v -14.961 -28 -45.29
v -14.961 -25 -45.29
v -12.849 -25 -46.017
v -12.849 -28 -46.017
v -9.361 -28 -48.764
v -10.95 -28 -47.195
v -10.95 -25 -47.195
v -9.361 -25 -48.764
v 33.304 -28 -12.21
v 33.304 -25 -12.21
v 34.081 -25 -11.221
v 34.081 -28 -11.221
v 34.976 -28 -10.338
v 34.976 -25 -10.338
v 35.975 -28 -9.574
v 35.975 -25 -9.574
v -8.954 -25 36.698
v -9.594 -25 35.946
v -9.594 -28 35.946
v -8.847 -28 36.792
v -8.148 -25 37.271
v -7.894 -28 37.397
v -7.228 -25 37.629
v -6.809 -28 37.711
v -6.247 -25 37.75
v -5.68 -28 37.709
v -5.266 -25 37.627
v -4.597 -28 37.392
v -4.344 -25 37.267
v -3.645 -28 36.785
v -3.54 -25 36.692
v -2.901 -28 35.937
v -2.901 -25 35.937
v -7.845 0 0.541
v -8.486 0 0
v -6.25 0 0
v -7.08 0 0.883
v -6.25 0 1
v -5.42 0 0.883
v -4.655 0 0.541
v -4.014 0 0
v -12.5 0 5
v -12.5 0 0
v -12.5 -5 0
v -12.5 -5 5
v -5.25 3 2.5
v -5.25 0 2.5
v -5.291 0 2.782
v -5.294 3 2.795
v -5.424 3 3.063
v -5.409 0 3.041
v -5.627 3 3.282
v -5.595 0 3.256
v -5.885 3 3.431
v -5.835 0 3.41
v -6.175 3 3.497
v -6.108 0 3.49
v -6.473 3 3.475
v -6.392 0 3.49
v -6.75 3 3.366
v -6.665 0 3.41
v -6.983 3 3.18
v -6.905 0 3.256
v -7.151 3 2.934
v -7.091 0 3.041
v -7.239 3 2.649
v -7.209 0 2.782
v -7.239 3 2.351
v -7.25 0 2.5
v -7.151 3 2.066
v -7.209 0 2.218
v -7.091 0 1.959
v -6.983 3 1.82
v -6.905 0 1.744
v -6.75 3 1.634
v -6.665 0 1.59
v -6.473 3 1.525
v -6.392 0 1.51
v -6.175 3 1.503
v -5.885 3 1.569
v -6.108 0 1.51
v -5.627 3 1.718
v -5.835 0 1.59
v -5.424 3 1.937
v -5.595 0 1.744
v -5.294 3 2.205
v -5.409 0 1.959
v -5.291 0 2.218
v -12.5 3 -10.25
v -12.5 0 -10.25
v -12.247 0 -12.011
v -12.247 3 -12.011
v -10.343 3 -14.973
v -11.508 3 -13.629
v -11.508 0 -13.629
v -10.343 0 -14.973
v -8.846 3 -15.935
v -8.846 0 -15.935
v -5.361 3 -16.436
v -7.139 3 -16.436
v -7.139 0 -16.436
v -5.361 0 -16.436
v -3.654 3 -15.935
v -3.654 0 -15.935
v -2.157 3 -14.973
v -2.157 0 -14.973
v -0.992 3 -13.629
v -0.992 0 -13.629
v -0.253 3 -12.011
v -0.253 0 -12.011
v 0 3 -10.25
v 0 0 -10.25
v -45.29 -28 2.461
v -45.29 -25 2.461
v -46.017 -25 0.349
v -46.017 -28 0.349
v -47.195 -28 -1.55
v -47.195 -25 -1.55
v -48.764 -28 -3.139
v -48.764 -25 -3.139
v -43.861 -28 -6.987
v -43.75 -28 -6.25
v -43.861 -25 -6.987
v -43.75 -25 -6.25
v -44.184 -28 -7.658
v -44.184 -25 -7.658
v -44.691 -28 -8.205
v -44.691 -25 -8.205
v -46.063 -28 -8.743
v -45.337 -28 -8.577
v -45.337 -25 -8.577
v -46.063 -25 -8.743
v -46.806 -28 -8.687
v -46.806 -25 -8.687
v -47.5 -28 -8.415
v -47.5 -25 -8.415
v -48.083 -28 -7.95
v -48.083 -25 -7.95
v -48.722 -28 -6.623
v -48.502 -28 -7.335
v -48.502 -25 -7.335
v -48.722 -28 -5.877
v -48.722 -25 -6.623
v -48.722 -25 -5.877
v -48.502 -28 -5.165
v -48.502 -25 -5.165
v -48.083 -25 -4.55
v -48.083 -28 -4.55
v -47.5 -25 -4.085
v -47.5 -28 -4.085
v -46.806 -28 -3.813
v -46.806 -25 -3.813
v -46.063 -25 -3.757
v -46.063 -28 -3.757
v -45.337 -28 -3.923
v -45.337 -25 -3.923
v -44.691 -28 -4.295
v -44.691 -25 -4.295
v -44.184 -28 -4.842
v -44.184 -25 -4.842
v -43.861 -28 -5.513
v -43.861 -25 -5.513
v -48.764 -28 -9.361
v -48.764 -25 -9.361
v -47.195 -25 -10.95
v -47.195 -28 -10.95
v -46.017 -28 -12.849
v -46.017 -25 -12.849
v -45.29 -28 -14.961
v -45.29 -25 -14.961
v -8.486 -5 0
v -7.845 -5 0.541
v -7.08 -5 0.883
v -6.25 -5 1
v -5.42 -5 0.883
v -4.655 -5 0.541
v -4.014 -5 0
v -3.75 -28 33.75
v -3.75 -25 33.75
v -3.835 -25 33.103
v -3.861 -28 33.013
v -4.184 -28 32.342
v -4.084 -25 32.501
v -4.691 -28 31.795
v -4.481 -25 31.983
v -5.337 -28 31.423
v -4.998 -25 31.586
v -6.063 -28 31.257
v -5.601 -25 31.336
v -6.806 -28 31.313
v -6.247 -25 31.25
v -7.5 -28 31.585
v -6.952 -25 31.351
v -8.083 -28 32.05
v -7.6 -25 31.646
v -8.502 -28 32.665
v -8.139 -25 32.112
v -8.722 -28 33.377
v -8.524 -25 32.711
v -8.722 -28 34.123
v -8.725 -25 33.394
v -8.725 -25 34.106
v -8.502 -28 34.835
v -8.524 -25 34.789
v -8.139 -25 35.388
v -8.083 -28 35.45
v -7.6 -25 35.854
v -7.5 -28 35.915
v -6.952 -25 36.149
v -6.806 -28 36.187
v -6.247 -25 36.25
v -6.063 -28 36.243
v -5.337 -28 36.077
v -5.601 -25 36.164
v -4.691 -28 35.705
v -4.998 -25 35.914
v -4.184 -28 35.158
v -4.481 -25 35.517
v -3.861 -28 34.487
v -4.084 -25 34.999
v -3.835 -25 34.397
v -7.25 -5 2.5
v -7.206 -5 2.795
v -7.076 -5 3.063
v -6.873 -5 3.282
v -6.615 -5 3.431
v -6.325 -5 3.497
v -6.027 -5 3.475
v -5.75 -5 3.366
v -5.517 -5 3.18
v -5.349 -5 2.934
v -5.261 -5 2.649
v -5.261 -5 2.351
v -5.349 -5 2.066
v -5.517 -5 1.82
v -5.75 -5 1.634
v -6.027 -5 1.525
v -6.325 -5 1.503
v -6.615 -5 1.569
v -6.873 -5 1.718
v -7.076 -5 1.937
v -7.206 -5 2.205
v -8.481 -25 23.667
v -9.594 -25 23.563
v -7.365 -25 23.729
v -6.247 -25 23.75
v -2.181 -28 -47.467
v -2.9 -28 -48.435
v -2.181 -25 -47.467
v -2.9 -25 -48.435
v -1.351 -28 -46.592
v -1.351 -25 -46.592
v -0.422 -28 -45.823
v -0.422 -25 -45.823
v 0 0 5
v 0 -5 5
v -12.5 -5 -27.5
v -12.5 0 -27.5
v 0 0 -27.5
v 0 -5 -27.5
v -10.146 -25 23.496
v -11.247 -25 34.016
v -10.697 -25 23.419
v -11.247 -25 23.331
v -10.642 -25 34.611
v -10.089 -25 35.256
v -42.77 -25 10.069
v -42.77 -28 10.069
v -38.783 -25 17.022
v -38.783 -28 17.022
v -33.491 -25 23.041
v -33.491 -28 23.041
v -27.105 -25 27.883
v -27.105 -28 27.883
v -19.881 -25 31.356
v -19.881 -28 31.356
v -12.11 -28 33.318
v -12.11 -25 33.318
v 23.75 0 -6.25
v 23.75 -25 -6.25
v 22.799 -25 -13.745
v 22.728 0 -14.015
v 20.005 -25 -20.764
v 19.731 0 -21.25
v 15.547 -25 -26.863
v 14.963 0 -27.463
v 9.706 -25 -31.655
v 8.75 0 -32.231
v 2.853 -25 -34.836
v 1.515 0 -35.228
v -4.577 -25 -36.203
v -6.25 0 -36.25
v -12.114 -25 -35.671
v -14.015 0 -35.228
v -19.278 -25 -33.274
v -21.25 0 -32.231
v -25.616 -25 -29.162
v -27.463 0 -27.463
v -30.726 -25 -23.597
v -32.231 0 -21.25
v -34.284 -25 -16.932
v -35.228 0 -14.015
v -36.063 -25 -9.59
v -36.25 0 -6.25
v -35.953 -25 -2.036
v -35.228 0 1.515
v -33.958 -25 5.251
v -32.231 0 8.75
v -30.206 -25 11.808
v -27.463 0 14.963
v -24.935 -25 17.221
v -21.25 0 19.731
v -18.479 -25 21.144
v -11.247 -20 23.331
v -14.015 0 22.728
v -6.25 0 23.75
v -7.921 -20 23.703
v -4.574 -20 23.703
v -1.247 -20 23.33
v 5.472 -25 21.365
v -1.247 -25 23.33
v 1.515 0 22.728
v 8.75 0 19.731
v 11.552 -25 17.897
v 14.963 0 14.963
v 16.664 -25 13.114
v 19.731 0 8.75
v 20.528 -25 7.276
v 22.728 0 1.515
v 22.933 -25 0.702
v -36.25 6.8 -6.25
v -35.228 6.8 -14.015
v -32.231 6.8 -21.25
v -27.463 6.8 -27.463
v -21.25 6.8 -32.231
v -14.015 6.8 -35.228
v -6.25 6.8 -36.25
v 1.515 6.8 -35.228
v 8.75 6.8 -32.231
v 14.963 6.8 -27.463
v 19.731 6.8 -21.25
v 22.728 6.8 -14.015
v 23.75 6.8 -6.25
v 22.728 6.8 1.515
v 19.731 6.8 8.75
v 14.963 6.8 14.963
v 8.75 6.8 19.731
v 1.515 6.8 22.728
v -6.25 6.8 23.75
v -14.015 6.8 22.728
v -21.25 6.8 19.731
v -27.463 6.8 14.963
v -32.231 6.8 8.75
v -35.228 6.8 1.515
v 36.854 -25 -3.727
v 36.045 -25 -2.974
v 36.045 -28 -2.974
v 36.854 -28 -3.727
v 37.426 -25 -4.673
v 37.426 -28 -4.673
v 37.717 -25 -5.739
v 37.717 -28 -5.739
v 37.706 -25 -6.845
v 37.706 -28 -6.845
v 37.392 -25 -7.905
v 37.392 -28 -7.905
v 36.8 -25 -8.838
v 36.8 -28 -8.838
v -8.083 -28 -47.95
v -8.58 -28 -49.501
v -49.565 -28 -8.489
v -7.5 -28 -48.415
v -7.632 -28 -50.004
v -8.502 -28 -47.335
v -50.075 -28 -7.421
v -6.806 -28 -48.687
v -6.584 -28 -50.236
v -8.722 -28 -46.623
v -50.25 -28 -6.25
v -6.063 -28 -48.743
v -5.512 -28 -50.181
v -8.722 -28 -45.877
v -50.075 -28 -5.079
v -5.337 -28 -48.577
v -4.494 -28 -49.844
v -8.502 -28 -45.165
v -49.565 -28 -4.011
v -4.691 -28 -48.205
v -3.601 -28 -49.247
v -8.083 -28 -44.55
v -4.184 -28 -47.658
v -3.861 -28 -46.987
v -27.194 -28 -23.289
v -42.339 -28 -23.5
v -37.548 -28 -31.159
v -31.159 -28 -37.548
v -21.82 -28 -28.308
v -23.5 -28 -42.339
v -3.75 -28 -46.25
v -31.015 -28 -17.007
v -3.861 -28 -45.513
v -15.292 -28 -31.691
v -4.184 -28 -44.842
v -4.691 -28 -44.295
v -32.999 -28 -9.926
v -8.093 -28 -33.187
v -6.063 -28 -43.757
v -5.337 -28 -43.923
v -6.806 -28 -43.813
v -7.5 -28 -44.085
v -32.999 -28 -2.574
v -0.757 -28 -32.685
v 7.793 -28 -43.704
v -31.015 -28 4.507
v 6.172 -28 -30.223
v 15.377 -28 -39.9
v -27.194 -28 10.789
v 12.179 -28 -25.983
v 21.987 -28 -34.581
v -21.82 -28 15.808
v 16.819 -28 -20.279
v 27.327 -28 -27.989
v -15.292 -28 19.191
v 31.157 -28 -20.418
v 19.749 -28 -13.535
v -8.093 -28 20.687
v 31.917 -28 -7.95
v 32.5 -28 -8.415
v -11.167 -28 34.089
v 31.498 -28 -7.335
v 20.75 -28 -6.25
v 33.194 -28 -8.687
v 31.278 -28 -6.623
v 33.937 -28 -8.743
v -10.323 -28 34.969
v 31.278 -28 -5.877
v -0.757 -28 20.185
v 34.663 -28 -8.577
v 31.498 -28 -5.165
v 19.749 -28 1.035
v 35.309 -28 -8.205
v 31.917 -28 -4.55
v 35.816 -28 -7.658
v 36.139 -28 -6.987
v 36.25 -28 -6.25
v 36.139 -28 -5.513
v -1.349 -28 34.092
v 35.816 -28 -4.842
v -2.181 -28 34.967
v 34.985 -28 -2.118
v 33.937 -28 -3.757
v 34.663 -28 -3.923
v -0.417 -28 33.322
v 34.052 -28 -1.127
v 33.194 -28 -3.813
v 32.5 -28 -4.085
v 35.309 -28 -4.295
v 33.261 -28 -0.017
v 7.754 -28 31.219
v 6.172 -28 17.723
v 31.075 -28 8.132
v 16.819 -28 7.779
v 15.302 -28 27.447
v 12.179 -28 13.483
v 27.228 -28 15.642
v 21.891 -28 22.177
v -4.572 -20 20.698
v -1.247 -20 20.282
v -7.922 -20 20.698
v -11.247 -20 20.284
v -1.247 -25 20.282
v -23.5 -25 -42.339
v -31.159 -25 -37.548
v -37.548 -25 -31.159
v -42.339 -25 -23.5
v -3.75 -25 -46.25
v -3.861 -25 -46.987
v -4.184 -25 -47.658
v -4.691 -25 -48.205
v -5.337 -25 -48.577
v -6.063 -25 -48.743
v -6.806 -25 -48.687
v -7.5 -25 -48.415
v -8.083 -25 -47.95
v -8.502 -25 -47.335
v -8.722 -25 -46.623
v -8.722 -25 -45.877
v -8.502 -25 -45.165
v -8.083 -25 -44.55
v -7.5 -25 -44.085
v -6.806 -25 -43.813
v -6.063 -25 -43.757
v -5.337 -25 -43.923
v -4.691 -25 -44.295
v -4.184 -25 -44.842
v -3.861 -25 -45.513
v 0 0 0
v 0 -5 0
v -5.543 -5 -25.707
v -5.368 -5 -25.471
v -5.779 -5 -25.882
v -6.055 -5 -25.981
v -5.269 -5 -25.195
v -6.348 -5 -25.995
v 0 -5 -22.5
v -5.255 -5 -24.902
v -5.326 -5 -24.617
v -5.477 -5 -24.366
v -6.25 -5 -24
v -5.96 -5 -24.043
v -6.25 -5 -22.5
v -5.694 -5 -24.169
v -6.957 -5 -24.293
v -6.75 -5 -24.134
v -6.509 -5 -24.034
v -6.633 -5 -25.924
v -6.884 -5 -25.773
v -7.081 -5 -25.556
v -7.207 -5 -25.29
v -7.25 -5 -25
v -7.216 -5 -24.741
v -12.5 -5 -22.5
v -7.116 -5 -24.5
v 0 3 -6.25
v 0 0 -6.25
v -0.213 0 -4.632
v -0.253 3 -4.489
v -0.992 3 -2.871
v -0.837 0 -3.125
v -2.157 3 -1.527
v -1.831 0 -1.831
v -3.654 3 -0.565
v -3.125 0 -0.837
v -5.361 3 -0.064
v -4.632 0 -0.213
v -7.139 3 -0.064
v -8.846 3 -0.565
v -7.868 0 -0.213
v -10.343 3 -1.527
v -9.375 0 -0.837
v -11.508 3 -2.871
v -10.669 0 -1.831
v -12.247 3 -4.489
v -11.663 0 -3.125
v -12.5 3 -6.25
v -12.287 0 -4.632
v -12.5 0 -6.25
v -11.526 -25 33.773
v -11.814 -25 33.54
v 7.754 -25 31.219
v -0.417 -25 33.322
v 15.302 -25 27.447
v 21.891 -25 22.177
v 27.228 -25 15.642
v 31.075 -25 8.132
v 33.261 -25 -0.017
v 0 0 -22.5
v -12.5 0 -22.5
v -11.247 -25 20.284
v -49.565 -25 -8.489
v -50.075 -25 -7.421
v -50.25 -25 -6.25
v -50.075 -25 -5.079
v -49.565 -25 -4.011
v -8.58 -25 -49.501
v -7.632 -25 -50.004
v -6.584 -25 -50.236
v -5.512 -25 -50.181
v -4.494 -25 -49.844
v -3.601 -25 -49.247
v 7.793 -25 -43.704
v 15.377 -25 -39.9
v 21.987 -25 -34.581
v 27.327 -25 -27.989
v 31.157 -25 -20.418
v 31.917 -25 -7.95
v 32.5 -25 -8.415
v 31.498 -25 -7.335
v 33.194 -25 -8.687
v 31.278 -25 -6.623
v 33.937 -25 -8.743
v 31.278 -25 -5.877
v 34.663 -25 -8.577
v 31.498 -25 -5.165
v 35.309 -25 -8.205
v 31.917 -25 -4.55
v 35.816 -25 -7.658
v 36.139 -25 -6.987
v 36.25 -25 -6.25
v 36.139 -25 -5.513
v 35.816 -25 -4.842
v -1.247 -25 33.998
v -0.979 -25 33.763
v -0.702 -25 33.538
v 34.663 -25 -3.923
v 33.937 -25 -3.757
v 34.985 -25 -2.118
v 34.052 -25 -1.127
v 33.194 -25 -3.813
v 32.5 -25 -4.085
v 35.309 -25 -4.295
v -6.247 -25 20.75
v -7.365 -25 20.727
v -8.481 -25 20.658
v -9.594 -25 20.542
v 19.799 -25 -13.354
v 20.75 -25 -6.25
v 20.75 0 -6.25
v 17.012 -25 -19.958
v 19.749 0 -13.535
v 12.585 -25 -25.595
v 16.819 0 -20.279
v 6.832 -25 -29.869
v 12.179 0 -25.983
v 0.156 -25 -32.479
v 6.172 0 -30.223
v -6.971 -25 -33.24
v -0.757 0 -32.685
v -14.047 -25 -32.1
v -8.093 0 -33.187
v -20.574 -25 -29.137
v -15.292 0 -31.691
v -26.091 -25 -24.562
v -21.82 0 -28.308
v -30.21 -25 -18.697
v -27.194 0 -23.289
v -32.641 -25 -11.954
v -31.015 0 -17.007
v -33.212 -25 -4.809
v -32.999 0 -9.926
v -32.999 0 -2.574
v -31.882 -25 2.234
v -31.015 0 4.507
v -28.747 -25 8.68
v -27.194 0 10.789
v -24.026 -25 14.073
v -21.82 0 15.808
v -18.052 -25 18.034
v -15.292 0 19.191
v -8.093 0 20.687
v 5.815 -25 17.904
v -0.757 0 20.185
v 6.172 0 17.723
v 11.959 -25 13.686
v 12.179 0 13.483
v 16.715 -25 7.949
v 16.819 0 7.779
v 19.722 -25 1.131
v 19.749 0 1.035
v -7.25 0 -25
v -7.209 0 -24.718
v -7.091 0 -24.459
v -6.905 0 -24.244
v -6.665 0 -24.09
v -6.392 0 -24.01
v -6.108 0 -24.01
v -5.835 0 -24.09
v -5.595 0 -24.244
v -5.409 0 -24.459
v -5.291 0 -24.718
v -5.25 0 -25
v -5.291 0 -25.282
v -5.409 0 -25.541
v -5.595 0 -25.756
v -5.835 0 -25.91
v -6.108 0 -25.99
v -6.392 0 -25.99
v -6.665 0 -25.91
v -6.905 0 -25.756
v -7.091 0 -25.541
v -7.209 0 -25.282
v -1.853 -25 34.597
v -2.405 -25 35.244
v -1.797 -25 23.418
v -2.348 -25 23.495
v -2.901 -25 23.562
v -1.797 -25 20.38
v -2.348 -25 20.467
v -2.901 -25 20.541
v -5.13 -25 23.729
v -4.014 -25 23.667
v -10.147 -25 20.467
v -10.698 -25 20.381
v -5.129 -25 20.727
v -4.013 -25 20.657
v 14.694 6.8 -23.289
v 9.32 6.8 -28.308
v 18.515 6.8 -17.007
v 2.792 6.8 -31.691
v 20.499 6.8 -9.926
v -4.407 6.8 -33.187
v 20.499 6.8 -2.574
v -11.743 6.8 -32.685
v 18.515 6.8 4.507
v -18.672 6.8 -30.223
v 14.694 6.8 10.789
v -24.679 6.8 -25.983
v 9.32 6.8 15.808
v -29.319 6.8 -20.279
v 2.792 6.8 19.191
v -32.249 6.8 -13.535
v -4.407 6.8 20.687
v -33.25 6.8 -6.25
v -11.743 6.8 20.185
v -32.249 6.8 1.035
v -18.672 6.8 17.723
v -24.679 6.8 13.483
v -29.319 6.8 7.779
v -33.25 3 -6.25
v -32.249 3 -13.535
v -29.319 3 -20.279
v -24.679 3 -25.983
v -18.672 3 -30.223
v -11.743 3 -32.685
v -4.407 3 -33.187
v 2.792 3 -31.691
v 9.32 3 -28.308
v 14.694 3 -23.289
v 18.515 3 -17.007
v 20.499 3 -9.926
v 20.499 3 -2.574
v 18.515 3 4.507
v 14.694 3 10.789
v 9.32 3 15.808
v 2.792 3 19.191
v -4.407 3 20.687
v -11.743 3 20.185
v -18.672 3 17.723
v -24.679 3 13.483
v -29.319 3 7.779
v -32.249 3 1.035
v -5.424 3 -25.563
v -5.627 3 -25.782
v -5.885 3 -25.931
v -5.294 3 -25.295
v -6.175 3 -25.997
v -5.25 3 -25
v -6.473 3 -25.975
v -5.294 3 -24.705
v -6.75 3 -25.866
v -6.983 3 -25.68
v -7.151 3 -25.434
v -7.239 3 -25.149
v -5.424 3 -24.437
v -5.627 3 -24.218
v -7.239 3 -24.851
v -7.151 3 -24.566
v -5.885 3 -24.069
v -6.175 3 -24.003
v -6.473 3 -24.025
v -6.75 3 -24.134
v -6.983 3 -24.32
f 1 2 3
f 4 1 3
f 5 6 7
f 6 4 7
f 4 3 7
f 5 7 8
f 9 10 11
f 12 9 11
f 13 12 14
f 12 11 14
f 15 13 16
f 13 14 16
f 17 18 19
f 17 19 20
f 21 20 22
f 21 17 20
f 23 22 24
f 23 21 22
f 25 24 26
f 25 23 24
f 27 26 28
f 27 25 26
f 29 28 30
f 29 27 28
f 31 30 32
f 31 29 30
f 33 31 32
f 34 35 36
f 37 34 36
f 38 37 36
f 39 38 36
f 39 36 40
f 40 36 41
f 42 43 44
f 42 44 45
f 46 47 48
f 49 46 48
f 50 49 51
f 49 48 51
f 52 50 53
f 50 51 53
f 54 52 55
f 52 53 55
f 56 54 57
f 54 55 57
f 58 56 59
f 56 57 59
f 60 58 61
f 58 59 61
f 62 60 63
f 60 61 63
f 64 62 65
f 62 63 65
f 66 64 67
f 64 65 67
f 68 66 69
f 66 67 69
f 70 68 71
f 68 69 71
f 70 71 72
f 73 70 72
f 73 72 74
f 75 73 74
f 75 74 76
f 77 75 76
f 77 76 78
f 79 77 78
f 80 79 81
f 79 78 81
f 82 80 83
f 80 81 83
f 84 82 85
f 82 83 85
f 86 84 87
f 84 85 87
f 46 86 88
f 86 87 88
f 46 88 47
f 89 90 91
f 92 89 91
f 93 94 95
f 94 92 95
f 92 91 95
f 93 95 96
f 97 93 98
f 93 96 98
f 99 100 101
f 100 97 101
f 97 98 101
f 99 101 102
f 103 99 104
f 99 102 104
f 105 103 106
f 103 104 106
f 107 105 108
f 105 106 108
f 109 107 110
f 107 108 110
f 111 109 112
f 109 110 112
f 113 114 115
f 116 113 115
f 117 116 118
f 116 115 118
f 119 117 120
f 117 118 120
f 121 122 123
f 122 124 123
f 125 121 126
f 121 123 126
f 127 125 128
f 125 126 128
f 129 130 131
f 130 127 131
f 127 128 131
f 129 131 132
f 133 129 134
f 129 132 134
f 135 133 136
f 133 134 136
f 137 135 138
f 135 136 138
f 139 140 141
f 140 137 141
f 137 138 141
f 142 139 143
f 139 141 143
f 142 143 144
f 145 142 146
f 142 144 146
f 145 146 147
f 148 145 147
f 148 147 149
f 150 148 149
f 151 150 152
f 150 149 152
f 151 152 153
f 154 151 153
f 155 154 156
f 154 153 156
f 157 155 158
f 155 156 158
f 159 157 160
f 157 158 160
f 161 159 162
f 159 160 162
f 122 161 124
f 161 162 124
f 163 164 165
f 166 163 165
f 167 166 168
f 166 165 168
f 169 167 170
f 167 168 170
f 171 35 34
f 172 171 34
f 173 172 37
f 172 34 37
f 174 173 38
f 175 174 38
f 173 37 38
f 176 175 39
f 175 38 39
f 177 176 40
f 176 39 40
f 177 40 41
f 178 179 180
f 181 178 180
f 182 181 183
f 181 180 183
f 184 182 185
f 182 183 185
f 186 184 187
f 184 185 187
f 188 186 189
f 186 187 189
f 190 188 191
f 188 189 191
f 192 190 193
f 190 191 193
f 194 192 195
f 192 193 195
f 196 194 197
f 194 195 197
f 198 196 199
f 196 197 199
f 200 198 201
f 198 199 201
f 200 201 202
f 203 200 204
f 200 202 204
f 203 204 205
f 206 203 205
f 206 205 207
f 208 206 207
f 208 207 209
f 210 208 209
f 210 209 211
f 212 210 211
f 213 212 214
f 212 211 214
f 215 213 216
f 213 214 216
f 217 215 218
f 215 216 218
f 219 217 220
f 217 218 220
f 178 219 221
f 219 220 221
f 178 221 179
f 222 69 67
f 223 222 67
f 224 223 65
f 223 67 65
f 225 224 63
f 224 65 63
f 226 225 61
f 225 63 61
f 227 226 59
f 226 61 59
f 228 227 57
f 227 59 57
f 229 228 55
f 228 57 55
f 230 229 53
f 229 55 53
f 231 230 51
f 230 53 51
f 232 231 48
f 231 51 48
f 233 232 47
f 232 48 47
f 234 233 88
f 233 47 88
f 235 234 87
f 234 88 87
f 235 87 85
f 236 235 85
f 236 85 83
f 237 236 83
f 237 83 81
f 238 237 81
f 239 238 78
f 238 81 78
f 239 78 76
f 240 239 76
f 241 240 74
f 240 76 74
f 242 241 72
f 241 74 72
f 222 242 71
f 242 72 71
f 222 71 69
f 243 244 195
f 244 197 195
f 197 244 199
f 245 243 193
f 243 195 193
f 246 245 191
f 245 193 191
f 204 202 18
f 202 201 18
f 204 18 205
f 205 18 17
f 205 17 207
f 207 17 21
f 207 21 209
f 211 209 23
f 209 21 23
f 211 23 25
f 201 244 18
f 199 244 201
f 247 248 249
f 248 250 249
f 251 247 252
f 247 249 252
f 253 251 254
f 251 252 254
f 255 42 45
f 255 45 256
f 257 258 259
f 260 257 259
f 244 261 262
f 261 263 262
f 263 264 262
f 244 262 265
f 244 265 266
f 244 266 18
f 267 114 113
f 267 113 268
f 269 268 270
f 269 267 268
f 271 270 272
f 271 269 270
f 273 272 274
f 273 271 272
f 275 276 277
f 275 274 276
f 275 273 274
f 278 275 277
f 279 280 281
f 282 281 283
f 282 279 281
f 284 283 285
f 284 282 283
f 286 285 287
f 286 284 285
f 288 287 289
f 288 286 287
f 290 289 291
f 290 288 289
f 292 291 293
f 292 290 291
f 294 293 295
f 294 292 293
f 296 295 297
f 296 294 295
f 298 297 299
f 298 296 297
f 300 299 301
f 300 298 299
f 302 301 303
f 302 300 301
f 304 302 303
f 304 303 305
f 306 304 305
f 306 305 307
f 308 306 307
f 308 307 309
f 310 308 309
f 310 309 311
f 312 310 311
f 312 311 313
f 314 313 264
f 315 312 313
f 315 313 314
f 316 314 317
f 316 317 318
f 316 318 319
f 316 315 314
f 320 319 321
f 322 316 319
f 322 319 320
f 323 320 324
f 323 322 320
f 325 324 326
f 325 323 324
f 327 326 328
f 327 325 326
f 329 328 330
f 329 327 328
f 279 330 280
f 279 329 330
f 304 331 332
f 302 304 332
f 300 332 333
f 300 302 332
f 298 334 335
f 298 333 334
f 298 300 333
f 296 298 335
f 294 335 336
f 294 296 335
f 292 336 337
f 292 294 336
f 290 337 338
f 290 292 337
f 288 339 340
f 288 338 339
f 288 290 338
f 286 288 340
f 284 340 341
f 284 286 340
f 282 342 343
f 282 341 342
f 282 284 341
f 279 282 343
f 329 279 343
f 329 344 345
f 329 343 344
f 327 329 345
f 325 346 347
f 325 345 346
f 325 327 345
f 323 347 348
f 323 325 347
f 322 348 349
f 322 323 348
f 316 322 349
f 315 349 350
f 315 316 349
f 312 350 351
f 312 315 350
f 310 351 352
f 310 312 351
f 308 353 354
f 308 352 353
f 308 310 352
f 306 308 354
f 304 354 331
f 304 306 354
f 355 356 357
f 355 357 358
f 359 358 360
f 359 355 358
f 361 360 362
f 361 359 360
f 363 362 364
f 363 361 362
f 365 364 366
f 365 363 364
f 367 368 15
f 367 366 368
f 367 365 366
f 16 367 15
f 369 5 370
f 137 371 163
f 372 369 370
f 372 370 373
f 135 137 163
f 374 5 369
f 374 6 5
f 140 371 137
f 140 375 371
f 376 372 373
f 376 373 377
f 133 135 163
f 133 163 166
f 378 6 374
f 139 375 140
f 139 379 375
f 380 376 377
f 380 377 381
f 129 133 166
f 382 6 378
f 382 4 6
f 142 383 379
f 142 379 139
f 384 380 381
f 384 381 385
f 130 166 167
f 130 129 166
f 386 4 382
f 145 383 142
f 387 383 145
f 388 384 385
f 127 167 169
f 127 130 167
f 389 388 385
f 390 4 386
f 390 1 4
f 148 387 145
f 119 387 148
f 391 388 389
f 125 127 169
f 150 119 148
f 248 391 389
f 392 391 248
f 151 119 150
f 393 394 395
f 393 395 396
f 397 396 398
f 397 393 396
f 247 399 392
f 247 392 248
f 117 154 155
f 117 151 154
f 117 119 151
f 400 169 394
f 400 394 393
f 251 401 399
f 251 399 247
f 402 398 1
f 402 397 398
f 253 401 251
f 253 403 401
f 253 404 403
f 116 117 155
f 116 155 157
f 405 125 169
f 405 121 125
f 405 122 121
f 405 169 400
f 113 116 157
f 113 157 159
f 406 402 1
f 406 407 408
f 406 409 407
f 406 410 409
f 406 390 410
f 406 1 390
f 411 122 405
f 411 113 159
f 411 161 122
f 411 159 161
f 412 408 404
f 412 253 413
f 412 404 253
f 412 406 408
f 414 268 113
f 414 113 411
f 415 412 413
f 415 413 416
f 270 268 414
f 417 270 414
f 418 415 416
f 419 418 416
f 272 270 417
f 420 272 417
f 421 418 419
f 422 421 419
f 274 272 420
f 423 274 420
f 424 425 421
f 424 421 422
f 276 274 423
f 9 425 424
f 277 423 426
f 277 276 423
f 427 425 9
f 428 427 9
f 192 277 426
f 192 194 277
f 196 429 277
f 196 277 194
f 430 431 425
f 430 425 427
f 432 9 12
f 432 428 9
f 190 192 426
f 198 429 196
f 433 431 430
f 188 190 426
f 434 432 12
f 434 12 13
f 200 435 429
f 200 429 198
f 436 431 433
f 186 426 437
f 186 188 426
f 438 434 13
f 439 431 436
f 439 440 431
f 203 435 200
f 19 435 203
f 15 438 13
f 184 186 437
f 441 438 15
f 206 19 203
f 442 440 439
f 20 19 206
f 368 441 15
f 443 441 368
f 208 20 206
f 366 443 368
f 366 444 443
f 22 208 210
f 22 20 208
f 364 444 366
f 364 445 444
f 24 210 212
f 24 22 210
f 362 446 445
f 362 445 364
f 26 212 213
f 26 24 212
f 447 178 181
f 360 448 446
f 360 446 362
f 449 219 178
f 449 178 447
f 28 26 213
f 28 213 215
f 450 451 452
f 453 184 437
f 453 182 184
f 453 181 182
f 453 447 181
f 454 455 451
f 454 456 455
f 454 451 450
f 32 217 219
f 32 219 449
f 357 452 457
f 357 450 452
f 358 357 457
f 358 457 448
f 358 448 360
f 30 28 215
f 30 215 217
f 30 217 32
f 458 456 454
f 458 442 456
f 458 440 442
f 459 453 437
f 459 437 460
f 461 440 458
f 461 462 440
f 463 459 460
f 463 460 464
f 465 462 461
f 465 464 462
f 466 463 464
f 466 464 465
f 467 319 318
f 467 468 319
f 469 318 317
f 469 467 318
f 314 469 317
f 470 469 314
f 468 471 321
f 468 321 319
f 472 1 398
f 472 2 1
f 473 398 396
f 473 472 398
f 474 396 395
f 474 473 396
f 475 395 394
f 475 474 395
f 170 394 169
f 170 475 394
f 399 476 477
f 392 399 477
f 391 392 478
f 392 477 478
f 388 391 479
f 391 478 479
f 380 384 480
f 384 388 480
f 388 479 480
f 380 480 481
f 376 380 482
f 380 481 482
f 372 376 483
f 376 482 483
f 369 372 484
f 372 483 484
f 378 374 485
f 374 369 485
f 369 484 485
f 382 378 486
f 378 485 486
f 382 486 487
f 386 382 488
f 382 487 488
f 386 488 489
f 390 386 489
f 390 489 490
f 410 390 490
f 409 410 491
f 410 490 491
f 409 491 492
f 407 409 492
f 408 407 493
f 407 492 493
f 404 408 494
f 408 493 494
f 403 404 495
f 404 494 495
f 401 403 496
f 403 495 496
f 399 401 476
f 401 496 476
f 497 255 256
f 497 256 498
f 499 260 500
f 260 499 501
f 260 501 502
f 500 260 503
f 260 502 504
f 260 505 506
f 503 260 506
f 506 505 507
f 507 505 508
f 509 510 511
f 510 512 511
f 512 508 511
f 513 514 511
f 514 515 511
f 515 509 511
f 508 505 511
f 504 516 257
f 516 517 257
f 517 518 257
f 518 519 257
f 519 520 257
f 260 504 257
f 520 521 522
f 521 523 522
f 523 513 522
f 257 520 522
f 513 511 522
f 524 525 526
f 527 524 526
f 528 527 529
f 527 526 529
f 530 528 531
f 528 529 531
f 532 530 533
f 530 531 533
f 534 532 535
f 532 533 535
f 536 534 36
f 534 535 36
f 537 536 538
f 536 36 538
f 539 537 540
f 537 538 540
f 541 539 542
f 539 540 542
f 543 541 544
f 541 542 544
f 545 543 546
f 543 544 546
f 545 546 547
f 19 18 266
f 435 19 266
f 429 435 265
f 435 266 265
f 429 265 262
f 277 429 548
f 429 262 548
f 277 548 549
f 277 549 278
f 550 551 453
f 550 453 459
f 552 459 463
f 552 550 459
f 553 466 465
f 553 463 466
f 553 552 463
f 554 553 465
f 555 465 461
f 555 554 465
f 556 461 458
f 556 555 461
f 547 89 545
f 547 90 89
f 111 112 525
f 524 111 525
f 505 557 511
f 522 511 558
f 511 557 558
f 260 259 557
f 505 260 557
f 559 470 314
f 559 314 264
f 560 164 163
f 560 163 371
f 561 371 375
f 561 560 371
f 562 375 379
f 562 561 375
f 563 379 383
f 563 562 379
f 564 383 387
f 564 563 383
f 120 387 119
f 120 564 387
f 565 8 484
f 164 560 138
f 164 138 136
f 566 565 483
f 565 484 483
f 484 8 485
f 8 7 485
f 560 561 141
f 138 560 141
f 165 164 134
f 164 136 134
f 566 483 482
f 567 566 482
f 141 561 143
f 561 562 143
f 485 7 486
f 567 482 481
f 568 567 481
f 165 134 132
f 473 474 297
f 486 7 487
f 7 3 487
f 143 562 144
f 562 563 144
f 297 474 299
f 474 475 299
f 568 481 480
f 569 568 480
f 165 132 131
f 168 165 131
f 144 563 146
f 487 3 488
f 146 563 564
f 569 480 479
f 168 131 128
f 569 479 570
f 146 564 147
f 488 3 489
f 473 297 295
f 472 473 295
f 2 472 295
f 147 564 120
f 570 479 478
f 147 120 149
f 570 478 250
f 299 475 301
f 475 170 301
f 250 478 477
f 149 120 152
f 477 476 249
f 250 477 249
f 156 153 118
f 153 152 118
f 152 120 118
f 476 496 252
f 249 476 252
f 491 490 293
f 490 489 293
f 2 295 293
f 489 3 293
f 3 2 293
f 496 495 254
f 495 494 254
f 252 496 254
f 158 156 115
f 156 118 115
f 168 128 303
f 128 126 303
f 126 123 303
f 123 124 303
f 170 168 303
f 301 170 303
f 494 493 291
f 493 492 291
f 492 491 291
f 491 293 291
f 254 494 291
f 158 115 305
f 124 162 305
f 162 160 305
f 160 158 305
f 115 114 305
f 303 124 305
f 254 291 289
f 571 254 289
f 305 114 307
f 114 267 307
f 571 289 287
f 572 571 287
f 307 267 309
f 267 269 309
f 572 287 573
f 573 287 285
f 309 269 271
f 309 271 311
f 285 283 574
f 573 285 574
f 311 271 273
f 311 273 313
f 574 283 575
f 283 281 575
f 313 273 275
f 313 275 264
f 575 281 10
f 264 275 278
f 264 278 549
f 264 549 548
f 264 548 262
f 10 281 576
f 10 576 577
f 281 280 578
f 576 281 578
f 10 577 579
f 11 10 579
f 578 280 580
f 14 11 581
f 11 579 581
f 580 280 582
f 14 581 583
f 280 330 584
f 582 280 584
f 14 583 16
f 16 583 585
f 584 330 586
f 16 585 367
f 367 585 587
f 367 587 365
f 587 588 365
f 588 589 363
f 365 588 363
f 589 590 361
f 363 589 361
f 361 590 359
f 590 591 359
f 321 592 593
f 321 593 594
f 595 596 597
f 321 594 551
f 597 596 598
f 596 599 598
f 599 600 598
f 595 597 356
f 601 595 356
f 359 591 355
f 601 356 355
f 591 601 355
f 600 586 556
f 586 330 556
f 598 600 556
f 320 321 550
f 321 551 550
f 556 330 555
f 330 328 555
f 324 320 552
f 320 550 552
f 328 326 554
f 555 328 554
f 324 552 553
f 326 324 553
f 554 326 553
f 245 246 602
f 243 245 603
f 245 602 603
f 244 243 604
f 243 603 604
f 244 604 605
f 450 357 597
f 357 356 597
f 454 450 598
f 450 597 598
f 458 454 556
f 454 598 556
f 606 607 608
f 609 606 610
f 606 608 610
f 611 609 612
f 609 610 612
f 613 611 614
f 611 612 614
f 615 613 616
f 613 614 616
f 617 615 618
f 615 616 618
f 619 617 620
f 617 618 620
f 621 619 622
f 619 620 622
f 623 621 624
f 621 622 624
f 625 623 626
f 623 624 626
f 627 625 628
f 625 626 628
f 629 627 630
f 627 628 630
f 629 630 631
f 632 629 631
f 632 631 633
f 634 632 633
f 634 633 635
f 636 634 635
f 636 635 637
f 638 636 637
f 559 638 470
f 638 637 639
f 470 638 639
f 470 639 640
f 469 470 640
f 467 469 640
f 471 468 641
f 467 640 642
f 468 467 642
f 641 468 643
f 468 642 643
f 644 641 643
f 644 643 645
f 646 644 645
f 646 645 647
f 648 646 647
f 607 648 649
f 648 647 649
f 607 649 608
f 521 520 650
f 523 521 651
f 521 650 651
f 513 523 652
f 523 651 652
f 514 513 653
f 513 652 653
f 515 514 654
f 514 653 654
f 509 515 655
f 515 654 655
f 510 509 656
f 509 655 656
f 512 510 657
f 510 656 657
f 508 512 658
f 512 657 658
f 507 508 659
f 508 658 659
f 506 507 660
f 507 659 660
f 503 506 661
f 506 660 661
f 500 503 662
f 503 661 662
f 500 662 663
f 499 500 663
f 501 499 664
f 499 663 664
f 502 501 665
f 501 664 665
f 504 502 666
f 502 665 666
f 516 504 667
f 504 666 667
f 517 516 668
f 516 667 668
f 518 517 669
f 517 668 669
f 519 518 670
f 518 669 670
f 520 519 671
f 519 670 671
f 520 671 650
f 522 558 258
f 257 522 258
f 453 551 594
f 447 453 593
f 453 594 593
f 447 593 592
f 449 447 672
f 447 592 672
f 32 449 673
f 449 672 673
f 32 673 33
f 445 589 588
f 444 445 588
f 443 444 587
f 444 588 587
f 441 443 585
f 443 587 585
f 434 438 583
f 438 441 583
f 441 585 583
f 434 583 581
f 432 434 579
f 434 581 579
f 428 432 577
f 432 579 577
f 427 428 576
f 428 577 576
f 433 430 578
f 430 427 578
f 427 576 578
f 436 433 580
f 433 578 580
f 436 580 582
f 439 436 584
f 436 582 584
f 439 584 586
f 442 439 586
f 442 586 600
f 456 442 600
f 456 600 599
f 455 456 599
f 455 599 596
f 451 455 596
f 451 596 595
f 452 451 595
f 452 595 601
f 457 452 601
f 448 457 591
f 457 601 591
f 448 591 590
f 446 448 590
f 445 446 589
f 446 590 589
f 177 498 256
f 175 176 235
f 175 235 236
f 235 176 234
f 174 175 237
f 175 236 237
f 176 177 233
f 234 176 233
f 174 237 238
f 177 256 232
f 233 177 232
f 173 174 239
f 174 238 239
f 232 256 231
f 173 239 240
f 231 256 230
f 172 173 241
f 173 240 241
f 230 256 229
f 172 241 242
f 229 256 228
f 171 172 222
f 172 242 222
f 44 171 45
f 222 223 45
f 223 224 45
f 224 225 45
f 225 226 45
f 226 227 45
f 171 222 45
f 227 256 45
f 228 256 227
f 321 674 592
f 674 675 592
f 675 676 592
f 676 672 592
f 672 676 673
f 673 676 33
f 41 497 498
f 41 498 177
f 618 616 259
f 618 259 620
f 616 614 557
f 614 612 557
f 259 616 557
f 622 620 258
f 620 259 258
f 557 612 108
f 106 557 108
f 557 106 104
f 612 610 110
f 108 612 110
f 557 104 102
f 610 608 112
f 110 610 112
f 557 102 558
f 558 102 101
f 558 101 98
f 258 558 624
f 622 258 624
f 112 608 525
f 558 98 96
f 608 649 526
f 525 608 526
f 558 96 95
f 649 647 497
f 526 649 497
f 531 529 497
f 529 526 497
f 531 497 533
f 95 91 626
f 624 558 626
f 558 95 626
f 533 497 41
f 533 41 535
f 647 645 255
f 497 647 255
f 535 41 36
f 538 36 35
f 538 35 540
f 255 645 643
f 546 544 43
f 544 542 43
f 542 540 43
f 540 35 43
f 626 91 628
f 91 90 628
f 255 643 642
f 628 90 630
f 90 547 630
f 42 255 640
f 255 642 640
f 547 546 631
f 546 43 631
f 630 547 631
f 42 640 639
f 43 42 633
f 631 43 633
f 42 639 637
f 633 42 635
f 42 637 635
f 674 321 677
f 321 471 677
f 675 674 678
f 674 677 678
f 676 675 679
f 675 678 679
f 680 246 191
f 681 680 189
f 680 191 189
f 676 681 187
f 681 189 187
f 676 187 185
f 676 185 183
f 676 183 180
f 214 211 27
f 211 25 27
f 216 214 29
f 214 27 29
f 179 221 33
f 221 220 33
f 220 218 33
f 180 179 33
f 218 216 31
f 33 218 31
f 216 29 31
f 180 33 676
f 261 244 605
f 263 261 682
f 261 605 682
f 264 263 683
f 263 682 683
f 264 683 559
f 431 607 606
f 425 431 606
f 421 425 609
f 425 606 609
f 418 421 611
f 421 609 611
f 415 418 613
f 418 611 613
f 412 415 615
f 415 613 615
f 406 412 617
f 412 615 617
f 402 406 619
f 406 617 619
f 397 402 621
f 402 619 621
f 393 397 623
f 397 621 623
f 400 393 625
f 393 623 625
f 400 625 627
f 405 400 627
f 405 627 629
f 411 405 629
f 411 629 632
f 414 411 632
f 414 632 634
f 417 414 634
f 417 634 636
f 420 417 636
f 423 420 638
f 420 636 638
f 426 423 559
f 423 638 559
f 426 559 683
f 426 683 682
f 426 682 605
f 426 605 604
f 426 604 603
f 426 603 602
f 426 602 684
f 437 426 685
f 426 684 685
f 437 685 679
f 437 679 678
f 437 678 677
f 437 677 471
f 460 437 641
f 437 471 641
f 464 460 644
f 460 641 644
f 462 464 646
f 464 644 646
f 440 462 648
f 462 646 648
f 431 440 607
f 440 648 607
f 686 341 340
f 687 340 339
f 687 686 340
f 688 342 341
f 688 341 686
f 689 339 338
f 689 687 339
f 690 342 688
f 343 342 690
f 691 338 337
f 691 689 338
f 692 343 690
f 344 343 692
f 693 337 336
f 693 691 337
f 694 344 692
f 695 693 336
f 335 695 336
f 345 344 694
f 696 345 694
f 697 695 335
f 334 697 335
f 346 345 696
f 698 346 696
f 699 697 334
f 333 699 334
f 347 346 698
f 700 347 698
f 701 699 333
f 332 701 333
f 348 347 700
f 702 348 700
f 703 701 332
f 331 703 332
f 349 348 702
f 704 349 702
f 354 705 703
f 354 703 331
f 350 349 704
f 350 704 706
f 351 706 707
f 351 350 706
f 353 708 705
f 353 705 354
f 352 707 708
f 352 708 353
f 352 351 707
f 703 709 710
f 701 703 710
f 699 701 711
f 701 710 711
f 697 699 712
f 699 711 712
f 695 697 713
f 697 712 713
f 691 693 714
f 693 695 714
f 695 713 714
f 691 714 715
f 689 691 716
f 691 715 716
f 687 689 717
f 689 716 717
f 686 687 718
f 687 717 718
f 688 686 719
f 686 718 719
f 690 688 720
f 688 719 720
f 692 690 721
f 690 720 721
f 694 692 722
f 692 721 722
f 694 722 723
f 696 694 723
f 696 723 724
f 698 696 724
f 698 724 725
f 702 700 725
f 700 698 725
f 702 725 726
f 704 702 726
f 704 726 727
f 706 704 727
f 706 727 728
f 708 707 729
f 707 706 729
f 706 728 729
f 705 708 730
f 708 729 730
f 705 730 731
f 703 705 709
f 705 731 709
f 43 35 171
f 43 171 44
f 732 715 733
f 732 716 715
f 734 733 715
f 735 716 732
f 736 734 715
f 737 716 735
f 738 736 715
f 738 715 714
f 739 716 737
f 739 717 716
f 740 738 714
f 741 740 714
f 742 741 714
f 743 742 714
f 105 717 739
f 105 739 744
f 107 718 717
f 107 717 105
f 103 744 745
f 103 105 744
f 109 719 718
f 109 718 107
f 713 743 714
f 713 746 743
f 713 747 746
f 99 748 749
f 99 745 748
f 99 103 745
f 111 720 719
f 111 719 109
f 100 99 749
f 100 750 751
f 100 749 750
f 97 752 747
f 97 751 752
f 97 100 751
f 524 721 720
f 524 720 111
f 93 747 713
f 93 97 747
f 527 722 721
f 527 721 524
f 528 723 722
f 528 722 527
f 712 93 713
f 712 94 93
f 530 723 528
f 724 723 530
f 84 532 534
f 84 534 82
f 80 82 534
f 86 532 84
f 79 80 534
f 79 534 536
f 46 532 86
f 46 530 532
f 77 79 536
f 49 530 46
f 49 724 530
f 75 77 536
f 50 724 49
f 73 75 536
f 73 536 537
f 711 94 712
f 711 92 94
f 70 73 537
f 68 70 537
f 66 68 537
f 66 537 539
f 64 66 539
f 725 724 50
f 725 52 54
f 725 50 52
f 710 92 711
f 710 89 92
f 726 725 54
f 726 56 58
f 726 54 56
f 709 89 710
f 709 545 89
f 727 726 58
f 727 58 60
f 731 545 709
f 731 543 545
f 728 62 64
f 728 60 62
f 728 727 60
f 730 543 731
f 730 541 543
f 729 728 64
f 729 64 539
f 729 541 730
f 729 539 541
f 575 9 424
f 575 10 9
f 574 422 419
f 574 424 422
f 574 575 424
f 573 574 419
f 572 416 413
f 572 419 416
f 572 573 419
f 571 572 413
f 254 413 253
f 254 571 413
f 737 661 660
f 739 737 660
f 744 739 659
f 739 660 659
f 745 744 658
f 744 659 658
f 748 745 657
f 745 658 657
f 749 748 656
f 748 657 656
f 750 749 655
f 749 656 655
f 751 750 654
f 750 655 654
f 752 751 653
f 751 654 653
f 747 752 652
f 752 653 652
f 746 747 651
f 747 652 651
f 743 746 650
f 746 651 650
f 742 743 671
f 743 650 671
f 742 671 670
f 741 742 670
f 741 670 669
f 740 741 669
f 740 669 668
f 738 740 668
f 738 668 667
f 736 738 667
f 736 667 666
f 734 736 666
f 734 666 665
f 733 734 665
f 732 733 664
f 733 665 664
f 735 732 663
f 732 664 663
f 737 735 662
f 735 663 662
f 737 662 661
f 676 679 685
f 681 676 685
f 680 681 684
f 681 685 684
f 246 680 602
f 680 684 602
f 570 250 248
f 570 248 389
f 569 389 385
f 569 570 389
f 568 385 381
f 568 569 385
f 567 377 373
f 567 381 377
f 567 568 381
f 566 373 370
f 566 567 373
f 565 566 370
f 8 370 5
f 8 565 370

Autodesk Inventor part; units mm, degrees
ref_plane "YZ Plane" through (0, 0, 0) normal (1, 0, 0) x (0, 1, 0)
ref_plane "XZ Plane" through (0, 0, 0) normal (0, 1, 0) x (-1, 0, 0)
ref_plane "XY Plane" through (0, 0, 0) normal (0, 0, 1) x (1, 0, 0)
sketch "Boceto1" plane through (0, 0, 0) normal (0, 1, 0) x (-1, 0, 0)
  line L0 (0, 0) -> (12.5, 0)
  line L1 (12.5, 0) -> (12.5, 5)
  line L2 (12.5, 5) -> (0, 5)
  line L3 (0, 5) -> (0, 0)
  circle A0 centre (6.25, 2.5) radius 1
  arc A1 (8.4861, 0) -> (4.0139, 0) centre (6.25, -2) ccw
  circle A2 centre (6.25, -25) radius 1
  line L4 (6.25, -25) -> (6.25, -22.5)
  line L5 (0, -22.5) -> (12.5, -22.5)
  line L6 (12.5, -22.5) -> (12.5, -27.5)
  line L7 (12.5, -27.5) -> (0, -27.5)
  line L8 (0, -27.5) -> (0, -22.5)
  line L9 (6.25, 0) -> (6.25, -6.25)
  arc A3 (12.5, -6.25) -> (0, -6.25) centre (6.25, -6.25) ccw
  arc A4 (0, -10.25) -> (12.5, -10.25) centre (6.25, -10.25) ccw
  line L10 (12.5, -10.25) -> (12.5, -6.25)
  line L11 (0, -10.25) -> (0, -6.25)
  circle A5 centre (6.25, -6.25) radius 27
  circle A6 centre (6.25, -6.25) radius 30
  dimension "d0" = 12.5
  dimension "d1" = 5
  dimension "d2" = 2
  dimension "d4" = 6
  dimension "d6" = 2
  dimension "d7" = 2.5
  dimension "d8" = 12.5
  dimension "d9" = 5
  dimension "d10" = 6.25
  dimension "d11" = 12.5
  dimension "d13" = 12.5
  dimension "d14" = 54
  dimension "d15" = 60
extrude "Extrusión1" add sketch "Boceto1" along normal blind 3 contours A5
extrude "Extrusión2" add sketch "Boceto1" along normal blind 6.8 contours A6
extrude "Extrusión3" add sketch "Boceto1" against normal blind 5 contours L3 L2 L1 L0 A1 | L5 L6 L7 L8
sketch "Boceto2" plane through (0, 0, 0) normal (0, 1, 0) x (1, 0, 0)
  line L0 (-4.0139, 0) -> (0, 0) projected
  arc A0 (-8.4861, 0) -> (-4.0139, 0) centre (-6.25, 2) ccw projected
  line L1 (-12.5, 0) -> (-8.4861, 0) projected
  line L2 (-12.5, -5) -> (-12.5, 0) projected
  line L3 (0, -5) -> (-12.5, -5) projected
  line L4 (0, 0) -> (0, -5) projected
  circle A1 centre (-6.25, -2.5) radius 1 projected
  line L5 (0, 27.5) -> (0, 22.5) projected
  line L6 (-12.5, 27.5) -> (0, 27.5) projected
  line L7 (-12.5, 22.5) -> (-12.5, 27.5) projected
  line L8 (0, 22.5) -> (-12.5, 22.5) projected
  circle A2 centre (-6.25, 25) radius 1 projected
  line L9 (-12.5, -5) -> (-12.5, 0) projected
  line L10 (-6.25, 0) -> (0, 0) projected
  line L11 (-12.5, -5) -> (0, -5)
  line L12 (0, -5) -> (0, 0)
  line L13 (-12.5, 0) -> (-12.5, -5)
  line L14 (-12.5, 27.5) -> (0, 27.5) projected
  line L15 (0, 22.5) -> (-12.5, 22.5) projected
  line L16 (0, 27.5) -> (-12.5, 27.5)
  line L17 (-12.5, 27.5) -> (-12.5, 22.5)
  line L18 (-12.5, 22.5) -> (0, 22.5)
  line L19 (0, 22.5) -> (0, 27.5)
  circle A3 centre (-6.25, -2.5) radius 1
  circle A4 centre (-6.25, 25) radius 1
  arc A5 (-8.4861, 0) -> (-4.0139, 0) centre (-6.25, 2) ccw
  line L20 (0, 0) -> (-4.0139, 0)
  line L21 (-8.4861, 0) -> (-12.5, 0)
  line L22 (-8.4861, 0) -> (-4.0139, 0)
  point P0 (-8.4861, 0)
  dimension "d22" = 2
  dimension "d23" = 2
  dimension "d24" = 6
extrude "Extrusión4" add sketch "Boceto2" along normal blind 3
sketch "Boceto3" plane through (-6.25, 0, -6.25) normal (0, -1, 0) x (1, 0, 0)
  circle A0 centre (0, 0) radius 30
  circle A1 centre (0, 0) radius 27
  point P0 (6.25, 6.25)
  dimension "d27" = 60
  dimension "d28" = 54
extrude "Extrusión5" add sketch "Boceto3" along normal blind 25
sketch "Boceto4" plane through (-6.25, -25, -6.25) normal (0, -1, 0) x (1, 0, 0)
  circle A0 centre (0, 0) radius 30
  circle A1 centre (0, 0) radius 27
  circle A2 centre (0, 40) radius 2.5
  arc A3 (3.3493, 42.1868) -> (-3.3436, 42.1955) centre (0, 40) ccw
  circle A4 centre (40, 0) radius 2.5
  arc A5 (42.2251, -3.324) -> (42.295, 3.2761) centre (40, 0) ccw
  circle A6 centre (0, -40) radius 2.5
  arc A7 (-3.111, -42.5143) -> (3.3503, -42.1853) centre (0, -40) ccw
  circle A8 centre (-40, 0) radius 2.5
  arc A9 (-42.5143, 3.111) -> (-42.5143, -3.111) centre (-40, 0) ccw
  line L0 (-3.995, 39.8) -> (-3.995, 39.8)
  arc A10 (3.3493, 42.1868) -> (5.8327, 39.5725) centre (11.7225, 47.6539) ccw
  arc A11 (-5.8604, 39.5684) -> (-3.3436, 42.1955) centre (-11.7026, 47.6843) ccw
  arc A12 (39.5114, 6.2326) -> (5.8327, 39.5725) centre (0, 0) ccw
  arc A13 (5.8279, -39.5732) -> (39.5535, -5.9597) centre (0, 0) ccw
  arc A14 (-5.8604, 39.5684) -> (-39.04, 8.7108) centre (0, 0) ccw
  arc A15 (-39.04, -8.7108) -> (-8.7108, -39.04) centre (0, 0) ccw
  line L1 (-3.995, -39.8) -> (-6.9108, -38.8236)
  line L2 (8.3455, -38.2373) -> (8.1717, -38.2997)
  arc A16 (42.2251, -3.324) -> (39.5535, -5.9597) centre (47.7877, -11.6341) ccw
  arc A17 (39.5114, 6.2326) -> (42.295, 3.2761) centre (48.0324, 11.4665) ccw
  arc A18 (5.8279, -39.5732) -> (3.3503, -42.1853) centre (11.726, -47.6486) ccw
  arc A19 (-3.111, -42.5143) -> (-8.7108, -39.04) centre (-10.8885, -48.8) ccw
  arc A20 (-42.5143, 3.111) -> (-39.04, 8.7108) centre (-48.8, 10.8885) ccw
  arc A21 (-39.04, -8.7108) -> (-42.5143, -3.111) centre (-48.8, -10.8885) ccw
  point P0 (6.25, 6.25)
  dimension "d32" = 60
  dimension "d33" = 54
  dimension "d34" = 5
  dimension "d35" = 8
  dimension "d36" = 5
  dimension "d37" = 8
  dimension "d38" = 5
  dimension "d39" = 8
  dimension "d40" = 5
  dimension "d41" = 8
  dimension "d42" = 10
  dimension "d43" = 10
extrude "Extrusión6" add sketch "Boceto4" along normal blind 3 contours A0 | A10 A12 A17 A5 A16 A13 A18 A7 A19 A15 A21 A9 A20 A14 A11 A3
sketch "Boceto5" plane through (0, 0, 0) normal (0, 0, 1) x (1, 0, 0)
  line L0 (-2.9007, -25) -> (-9.5936, -25) projected
  line L1 (-9.5936, -25) -> (-9.5936, -28) projected
  line L2 (-2.9007, -28) -> (-9.5936, -28) projected
  line L3 (-2.9007, -25) -> (-2.9007, -28) projected
  line L4 (-9.5936, -25) -> (-12.1104, -25) projected
  line L5 (-12.1104, -25) -> (-12.1104, -28) projected
  line L6 (-9.5936, -28) -> (-12.1104, -28) projected
  line L7 (-9.5936, -25) -> (-9.5936, -28) projected
  line L8 (-0.4173, -25) -> (-2.9007, -25) projected
  line L9 (-2.9007, -25) -> (-2.9007, -28) projected
  line L10 (-0.4173, -28) -> (-2.9007, -28) projected
  line L11 (-0.4173, -25) -> (-0.4173, -28) projected
  line L12 (-6.2472, -25) -> (-1.2472, -25)
  line L13 (-0.4173, -25) -> (-2.9007, -25) projected
  line L14 (-1.2472, -25) -> (-11.2472, -25)
  line L15 (-11.2472, -25) -> (-1.2472, -25)
  line L16 (-1.2472, -25) -> (-1.2472, -20)
  line L17 (-1.2472, -20) -> (-11.2472, -20)
  line L18 (-11.2472, -20) -> (-11.2472, -25)
  point P0 (0, 0)
  dimension "d46" = 5
  dimension "d47" = 10
  dimension "d48" = 10
  dimension "d49" = 5
extrude "Extrusión7" cut sketch "Boceto5" along normal blind 40 contours L0 L4 L18 L17 L16 L8
properties part number "sombreronuevasversionsanti"
